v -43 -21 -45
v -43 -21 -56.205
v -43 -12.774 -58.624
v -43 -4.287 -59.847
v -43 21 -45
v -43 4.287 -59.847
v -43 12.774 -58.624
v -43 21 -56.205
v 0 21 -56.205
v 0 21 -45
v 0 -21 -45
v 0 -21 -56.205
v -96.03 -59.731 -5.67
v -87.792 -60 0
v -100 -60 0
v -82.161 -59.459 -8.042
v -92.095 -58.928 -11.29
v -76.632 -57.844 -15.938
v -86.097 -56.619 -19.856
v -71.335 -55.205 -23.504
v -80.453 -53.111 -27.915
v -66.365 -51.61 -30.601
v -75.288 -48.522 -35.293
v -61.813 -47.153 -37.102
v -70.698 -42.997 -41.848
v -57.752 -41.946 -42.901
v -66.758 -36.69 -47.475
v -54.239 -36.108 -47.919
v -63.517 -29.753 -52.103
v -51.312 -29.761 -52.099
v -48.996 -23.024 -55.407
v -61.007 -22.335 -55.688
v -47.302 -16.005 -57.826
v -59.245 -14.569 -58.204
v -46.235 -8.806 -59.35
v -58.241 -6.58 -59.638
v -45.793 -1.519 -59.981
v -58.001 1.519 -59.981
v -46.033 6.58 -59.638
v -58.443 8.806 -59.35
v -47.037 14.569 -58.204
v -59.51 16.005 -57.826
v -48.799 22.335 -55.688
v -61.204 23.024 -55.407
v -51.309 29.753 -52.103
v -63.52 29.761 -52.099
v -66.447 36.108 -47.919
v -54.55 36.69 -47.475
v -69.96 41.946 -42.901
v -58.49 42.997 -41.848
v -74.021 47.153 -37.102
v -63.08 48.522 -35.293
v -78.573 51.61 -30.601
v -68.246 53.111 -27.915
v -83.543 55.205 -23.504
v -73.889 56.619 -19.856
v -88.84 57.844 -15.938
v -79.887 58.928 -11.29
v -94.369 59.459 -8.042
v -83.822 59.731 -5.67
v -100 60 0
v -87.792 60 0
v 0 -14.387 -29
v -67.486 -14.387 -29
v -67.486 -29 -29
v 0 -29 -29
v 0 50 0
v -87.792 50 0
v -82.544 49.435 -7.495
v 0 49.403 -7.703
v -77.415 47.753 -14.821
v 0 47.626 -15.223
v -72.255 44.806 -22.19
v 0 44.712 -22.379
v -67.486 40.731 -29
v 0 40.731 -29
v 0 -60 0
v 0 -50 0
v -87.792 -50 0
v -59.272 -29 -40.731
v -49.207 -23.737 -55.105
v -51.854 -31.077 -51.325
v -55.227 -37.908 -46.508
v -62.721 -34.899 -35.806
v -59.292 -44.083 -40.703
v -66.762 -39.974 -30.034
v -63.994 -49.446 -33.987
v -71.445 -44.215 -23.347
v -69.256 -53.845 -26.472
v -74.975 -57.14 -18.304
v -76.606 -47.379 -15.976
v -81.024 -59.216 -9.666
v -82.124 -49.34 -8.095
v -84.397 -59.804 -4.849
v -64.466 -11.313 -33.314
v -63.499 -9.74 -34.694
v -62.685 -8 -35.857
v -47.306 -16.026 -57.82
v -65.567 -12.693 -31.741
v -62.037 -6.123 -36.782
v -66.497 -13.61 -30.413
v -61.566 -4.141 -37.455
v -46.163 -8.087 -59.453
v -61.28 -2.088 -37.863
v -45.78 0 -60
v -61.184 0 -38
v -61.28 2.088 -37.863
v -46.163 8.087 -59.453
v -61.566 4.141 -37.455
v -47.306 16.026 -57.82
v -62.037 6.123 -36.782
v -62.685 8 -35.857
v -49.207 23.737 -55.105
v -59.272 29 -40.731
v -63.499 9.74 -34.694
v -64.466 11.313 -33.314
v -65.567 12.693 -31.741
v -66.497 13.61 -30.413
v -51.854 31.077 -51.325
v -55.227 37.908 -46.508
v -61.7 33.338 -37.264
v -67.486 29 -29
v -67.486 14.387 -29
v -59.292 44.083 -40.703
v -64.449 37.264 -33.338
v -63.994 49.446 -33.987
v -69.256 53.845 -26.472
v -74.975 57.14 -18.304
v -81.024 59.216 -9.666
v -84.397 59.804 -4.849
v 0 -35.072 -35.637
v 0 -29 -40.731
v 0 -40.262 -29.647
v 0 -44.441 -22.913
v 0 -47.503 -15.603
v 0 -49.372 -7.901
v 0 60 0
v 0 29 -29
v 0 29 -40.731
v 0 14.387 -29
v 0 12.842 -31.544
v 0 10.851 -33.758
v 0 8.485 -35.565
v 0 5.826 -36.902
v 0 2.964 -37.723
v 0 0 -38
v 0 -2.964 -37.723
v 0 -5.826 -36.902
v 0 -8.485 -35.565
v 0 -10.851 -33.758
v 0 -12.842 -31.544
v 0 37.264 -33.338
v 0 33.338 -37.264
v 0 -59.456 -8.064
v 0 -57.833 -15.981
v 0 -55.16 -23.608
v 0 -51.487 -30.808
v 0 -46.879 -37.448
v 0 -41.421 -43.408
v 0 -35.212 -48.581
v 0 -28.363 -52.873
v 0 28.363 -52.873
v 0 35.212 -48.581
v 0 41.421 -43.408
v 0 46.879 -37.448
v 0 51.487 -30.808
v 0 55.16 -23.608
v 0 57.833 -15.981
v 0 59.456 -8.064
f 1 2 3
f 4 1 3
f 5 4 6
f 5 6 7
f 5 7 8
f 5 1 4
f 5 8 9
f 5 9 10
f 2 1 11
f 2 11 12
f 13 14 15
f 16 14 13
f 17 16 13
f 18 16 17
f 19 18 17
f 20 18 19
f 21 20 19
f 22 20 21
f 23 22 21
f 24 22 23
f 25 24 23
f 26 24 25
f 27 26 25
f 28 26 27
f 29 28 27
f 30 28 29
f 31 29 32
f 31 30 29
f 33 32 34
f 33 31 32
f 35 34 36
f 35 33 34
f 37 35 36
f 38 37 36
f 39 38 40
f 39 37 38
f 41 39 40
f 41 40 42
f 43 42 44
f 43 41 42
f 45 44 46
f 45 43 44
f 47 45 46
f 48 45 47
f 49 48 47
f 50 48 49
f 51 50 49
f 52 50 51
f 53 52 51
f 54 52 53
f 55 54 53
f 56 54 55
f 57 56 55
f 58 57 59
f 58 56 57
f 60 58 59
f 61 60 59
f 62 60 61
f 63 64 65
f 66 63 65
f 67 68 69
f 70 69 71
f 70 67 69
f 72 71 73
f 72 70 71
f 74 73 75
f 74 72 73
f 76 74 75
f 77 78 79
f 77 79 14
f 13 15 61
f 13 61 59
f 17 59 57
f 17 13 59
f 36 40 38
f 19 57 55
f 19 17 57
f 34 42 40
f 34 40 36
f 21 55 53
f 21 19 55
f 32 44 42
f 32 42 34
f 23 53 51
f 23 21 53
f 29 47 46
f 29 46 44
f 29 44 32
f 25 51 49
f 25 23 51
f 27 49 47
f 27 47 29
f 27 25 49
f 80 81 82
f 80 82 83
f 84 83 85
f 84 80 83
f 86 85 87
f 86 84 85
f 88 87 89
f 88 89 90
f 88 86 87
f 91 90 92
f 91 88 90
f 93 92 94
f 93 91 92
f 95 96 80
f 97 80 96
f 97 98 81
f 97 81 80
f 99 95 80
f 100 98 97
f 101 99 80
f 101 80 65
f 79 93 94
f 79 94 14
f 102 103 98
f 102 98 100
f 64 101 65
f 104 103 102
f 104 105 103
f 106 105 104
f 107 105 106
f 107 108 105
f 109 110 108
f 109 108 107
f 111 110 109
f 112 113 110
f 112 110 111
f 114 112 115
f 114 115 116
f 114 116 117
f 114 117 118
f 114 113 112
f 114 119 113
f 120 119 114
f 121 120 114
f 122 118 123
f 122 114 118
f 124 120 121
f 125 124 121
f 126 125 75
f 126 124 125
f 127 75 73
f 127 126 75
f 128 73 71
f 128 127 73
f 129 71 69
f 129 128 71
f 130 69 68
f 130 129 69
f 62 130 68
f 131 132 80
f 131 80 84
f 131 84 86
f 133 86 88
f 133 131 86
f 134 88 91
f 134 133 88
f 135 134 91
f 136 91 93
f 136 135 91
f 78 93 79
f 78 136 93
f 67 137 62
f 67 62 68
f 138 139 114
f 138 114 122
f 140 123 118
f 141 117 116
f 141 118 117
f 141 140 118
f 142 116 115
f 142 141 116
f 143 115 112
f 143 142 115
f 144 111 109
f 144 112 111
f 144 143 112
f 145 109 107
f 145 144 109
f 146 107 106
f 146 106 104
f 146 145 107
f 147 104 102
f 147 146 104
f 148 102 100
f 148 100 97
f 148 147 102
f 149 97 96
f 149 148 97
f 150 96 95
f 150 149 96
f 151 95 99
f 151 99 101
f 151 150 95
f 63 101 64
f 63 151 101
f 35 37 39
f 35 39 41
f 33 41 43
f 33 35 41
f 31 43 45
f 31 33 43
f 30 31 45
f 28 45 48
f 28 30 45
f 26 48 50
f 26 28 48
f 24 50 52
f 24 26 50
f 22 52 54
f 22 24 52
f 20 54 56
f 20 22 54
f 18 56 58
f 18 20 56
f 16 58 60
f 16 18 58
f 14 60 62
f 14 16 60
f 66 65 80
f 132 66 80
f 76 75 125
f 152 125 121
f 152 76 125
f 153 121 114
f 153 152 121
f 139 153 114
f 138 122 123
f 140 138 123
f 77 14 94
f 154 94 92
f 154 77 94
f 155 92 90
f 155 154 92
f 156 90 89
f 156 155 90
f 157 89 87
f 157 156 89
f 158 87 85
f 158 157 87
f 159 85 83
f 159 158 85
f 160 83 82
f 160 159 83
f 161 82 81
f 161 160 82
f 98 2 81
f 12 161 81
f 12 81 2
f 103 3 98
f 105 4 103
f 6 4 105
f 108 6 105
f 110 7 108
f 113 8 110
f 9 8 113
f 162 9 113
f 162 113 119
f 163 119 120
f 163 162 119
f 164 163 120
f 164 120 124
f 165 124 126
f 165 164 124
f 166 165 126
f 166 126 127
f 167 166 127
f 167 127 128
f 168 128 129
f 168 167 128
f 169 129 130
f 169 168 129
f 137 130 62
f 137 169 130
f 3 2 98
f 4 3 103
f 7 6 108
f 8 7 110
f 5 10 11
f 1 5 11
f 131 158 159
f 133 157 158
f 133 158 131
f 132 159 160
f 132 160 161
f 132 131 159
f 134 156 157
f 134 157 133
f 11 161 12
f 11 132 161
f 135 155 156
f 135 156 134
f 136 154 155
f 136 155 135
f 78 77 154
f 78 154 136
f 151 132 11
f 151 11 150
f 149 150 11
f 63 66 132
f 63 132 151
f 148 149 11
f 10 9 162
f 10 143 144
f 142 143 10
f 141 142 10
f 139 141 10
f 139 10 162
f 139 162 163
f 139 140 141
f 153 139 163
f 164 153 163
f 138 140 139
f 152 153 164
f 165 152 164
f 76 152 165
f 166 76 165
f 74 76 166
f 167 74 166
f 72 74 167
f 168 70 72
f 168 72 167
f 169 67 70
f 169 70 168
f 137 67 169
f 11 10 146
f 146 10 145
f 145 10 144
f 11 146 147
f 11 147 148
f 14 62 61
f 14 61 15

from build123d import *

# Parameters (mm, degrees)
F1_DEPTH      = 100
F3_DEPTH      = 79.9
F3_DEPTH_BACK = 98
F6_DEPTH      = 74.8
F6_DEPTH_BACK = 93.6
F7_DEPTH      = 115.8
F8_DEPTH      = 43


with BuildPart() as f1:
    # F0 (on Right) → F1 (new body)
    with BuildSketch(Plane.YZ):
        with BuildLine():
            Line((-50, 0), (-60, 0))
            ThreePointArc((-60, 0), (-49.2950301755, -34.205262753), (-21, -56.2049819856))
            Line((-21, -56.2049819856), (-21, -45.3762052182))
            ThreePointArc((-21, -45.3762052182), (-21.3980741453, -45.1898486706), (-21.7944947177, -45))
            ThreePointArc((-21.7944947177, -45), (-25.4867934421, -43.0165475142), (-29, -40.7308237088))
            ThreePointArc((-29, -40.7308237088), (-44.4409720866, -22.9128784748), (-50, 0))
        make_face()
        with BuildLine():
            Line((-29, -29), (-29, -40.7308237088))
            ThreePointArc((-29, -40.7308237088), (-25.4867934421, -43.0165475142), (-21.7944947177, -45))
            Line((-21.7944947177, -45), (-21, -45))
            Line((-21, -45), (21, -45))
            Line((21, -45), (21.7944947177, -45))
            ThreePointArc((21.7944947177, -45), (25.4867934421, -43.0165475142), (29, -40.7308237088))
            Line((29, -40.7308237088), (29, -29))
            Line((29, -29), (14.3874945699, -29))
            ThreePointArc((14.3874945699, -29), (0, -38), (-14.3874945699, -29))
            Line((-14.3874945699, -29), (-29, -29))
        make_face()
        with BuildLine():
            Line((21, -45.3762052182), (21, -56.2049819856))
            ThreePointArc((21, -56.2049819856), (49.2950301755, -34.205262753), (60, 0))
            Line((60, 0), (50, 0))
            ThreePointArc((50, 0), (47.626364471, -15.2226609789), (40.7308237088, -29))
            ThreePointArc((40.7308237088, -29), (35.3553390593, -35.3553390593), (29, -40.7308237088))
            ThreePointArc((29, -40.7308237088), (25.4867934421, -43.0165475142), (21.7944947177, -45))
            ThreePointArc((21.7944947177, -45), (21.3980741453, -45.1898486706), (21, -45.3762052182))
        make_face()
        with BuildLine():
            Line((21, -45), (21, -45.3762052182))
            ThreePointArc((21, -45.3762052182), (21.3980741453, -45.1898486706), (21.7944947177, -45))
            Line((21.7944947177, -45), (21, -45))
        make_face()
        with BuildLine():
            ThreePointArc((-21.7944947177, -45), (-21.3980741453, -45.1898486706), (-21, -45.3762052182))
            Line((-21, -45.3762052182), (-21, -45))
            Line((-21, -45), (-21.7944947177, -45))
        make_face()
        with BuildLine():
            Line((-21, -45), (-21, -45.3762052182))
            ThreePointArc((-21, -45.3762052182), (0, -50), (21, -45.3762052182))
            Line((21, -45.3762052182), (21, -45))
            Line((21, -45), (-21, -45))
        make_face()
        with BuildLine():
            Line((-21, -45.3762052182), (-21, -56.2049819856))
            ThreePointArc((-21, -56.2049819856), (0, -60), (21, -56.2049819856))
            Line((21, -56.2049819856), (21, -45.3762052182))
            ThreePointArc((21, -45.3762052182), (0, -50), (-21, -45.3762052182))
        make_face()
    extrude(amount=-F1_DEPTH)

    # F2 (on Front) → F3 (cut, two sides)
    with BuildSketch(Plane.XZ) as f3_sk:
        Polygon((-57.9875477074, -60), (-100, 0), (-87.7922533566, 0), (-91.80847905, 5.7357647186), (-123.0464950204, 5.7357647186), (-123.0464950204, -66.0766197592), (-41.5249061018, -66.0766197592), (-45.779801064, -60), align=None)
        Polygon((-87.7922533566, 0), (-100, 0), (-57.9875477074, -60), (-45.779801064, -60), align=None)
    extrude(amount=-F3_DEPTH, mode=Mode.SUBTRACT)
    extrude(f3_sk.sketch, amount=F3_DEPTH_BACK, mode=Mode.SUBTRACT)


with BuildPart() as f6:
    # F5 (on Front) → F6 (new body, two sides)
    with BuildSketch(Plane.XZ) as f6_sk:
        Polygon((-41.5249061018, -66.0766197592), (-91.80847905, 5.7357647186), (-104.0162256934, 5.7357647186), (-100, 0), (-56.8908456845, -61.5662528081), (-53.7326527452, -66.0766197592), align=None)
    extrude(amount=F6_DEPTH)
    extrude(f6_sk.sketch, amount=-F6_DEPTH_BACK)


with BuildPart() as f7_tool:
    # F0 (on Right) → F7 (new body)
    with BuildSketch(Plane.YZ):
        with BuildLine():
            Line((-50, 0), (-60, 0))
            ThreePointArc((-60, 0), (-49.2950301755, -34.205262753), (-21, -56.2049819856))
            Line((-21, -56.2049819856), (-21, -45.3762052182))
            ThreePointArc((-21, -45.3762052182), (-21.3980741453, -45.1898486706), (-21.7944947177, -45))
            ThreePointArc((-21.7944947177, -45), (-25.4867934421, -43.0165475142), (-29, -40.7308237088))
            ThreePointArc((-29, -40.7308237088), (-44.4409720866, -22.9128784748), (-50, 0))
        make_face()
        with BuildLine():
            Line((50, 0), (-50, 0))
            ThreePointArc((-50, 0), (-44.4409720866, -22.9128784748), (-29, -40.7308237088))
            Line((-29, -40.7308237088), (-29, -29))
            Line((-29, -29), (-14.3874945699, -29))
            ThreePointArc((-14.3874945699, -29), (-3.5916630466, -6.4083369534), (16, -22))
            ThreePointArc((16, -22), (15.5916630466, -25.5916630466), (14.3874945699, -29))
            Line((14.3874945699, -29), (29, -29))
            Line((29, -29), (40.7308237088, -29))
            ThreePointArc((40.7308237088, -29), (47.626364471, -15.2226609789), (50, 0))
        make_face()
        with BuildLine():
            ThreePointArc((16, -22), (-3.5916630466, -6.4083369534), (-14.3874945699, -29))
            Line((-14.3874945699, -29), (14.3874945699, -29))
            ThreePointArc((14.3874945699, -29), (15.5916630466, -25.5916630466), (16, -22))
        make_face()
        with BuildLine():
            Line((21, -45.3762052182), (21, -56.2049819856))
            ThreePointArc((21, -56.2049819856), (49.2950301755, -34.205262753), (60, 0))
            Line((60, 0), (50, 0))
            ThreePointArc((50, 0), (47.626364471, -15.2226609789), (40.7308237088, -29))
            ThreePointArc((40.7308237088, -29), (35.3553390593, -35.3553390593), (29, -40.7308237088))
            ThreePointArc((29, -40.7308237088), (25.4867934421, -43.0165475142), (21.7944947177, -45))
            ThreePointArc((21.7944947177, -45), (21.3980741453, -45.1898486706), (21, -45.3762052182))
        make_face()
        with BuildLine():
            Line((14.3874945699, -29), (-14.3874945699, -29))
            ThreePointArc((-14.3874945699, -29), (0, -38), (14.3874945699, -29))
        make_face()
        with BuildLine():
            Line((-29, -29), (-29, -40.7308237088))
            ThreePointArc((-29, -40.7308237088), (-25.4867934421, -43.0165475142), (-21.7944947177, -45))
            Line((-21.7944947177, -45), (-21, -45))
            Line((-21, -45), (21, -45))
            Line((21, -45), (21.7944947177, -45))
            ThreePointArc((21.7944947177, -45), (25.4867934421, -43.0165475142), (29, -40.7308237088))
            Line((29, -40.7308237088), (29, -29))
            Line((29, -29), (14.3874945699, -29))
            ThreePointArc((14.3874945699, -29), (0, -38), (-14.3874945699, -29))
            Line((-14.3874945699, -29), (-29, -29))
        make_face()
        with BuildLine():
            ThreePointArc((29, -40.7308237088), (35.3553390593, -35.3553390593), (40.7308237088, -29))
            Line((40.7308237088, -29), (29, -29))
            Line((29, -29), (29, -40.7308237088))
        make_face()
        with BuildLine():
            Line((-21, -45), (-21, -45.3762052182))
            ThreePointArc((-21, -45.3762052182), (0, -50), (21, -45.3762052182))
            Line((21, -45.3762052182), (21, -45))
            Line((21, -45), (-21, -45))
        make_face()
        with BuildLine():
            Line((-21, -45.3762052182), (-21, -56.2049819856))
            ThreePointArc((-21, -56.2049819856), (0, -60), (21, -56.2049819856))
            Line((21, -56.2049819856), (21, -45.3762052182))
            ThreePointArc((21, -45.3762052182), (0, -50), (-21, -45.3762052182))
        make_face()
        with BuildLine():
            Line((21, -45), (21, -45.3762052182))
            ThreePointArc((21, -45.3762052182), (21.3980741453, -45.1898486706), (21.7944947177, -45))
            Line((21.7944947177, -45), (21, -45))
        make_face()
        with BuildLine():
            ThreePointArc((-21.7944947177, -45), (-21.3980741453, -45.1898486706), (-21, -45.3762052182))
            Line((-21, -45.3762052182), (-21, -45))
            Line((-21, -45), (-21.7944947177, -45))
        make_face()
    extrude(amount=-F7_DEPTH)


with BuildPart() as f1_1:
    add(f1.part)

    # F7: intersect by f7_tool
    add(f7_tool.part, mode=Mode.INTERSECT)

    # F0 (on Right) → F8 (cut)
    with BuildSketch(Plane.YZ):
        with BuildLine():
            Line((-21, -45), (-21, -45.3762052182))
            ThreePointArc((-21, -45.3762052182), (0, -50), (21, -45.3762052182))
            Line((21, -45.3762052182), (21, -45))
            Line((21, -45), (-21, -45))
        make_face()
        with BuildLine():
            Line((-21, -45.3762052182), (-21, -56.2049819856))
            ThreePointArc((-21, -56.2049819856), (0, -60), (21, -56.2049819856))
            Line((21, -56.2049819856), (21, -45.3762052182))
            ThreePointArc((21, -45.3762052182), (0, -50), (-21, -45.3762052182))
        make_face()
    extrude(amount=-F8_DEPTH, mode=Mode.SUBTRACT)


with BuildPart() as f6_1:
    add(f6.part)

    # F7: intersect by f7_tool
    add(f7_tool.part, mode=Mode.INTERSECT)


solid = Compound([f1_1.part, f6_1.part])
